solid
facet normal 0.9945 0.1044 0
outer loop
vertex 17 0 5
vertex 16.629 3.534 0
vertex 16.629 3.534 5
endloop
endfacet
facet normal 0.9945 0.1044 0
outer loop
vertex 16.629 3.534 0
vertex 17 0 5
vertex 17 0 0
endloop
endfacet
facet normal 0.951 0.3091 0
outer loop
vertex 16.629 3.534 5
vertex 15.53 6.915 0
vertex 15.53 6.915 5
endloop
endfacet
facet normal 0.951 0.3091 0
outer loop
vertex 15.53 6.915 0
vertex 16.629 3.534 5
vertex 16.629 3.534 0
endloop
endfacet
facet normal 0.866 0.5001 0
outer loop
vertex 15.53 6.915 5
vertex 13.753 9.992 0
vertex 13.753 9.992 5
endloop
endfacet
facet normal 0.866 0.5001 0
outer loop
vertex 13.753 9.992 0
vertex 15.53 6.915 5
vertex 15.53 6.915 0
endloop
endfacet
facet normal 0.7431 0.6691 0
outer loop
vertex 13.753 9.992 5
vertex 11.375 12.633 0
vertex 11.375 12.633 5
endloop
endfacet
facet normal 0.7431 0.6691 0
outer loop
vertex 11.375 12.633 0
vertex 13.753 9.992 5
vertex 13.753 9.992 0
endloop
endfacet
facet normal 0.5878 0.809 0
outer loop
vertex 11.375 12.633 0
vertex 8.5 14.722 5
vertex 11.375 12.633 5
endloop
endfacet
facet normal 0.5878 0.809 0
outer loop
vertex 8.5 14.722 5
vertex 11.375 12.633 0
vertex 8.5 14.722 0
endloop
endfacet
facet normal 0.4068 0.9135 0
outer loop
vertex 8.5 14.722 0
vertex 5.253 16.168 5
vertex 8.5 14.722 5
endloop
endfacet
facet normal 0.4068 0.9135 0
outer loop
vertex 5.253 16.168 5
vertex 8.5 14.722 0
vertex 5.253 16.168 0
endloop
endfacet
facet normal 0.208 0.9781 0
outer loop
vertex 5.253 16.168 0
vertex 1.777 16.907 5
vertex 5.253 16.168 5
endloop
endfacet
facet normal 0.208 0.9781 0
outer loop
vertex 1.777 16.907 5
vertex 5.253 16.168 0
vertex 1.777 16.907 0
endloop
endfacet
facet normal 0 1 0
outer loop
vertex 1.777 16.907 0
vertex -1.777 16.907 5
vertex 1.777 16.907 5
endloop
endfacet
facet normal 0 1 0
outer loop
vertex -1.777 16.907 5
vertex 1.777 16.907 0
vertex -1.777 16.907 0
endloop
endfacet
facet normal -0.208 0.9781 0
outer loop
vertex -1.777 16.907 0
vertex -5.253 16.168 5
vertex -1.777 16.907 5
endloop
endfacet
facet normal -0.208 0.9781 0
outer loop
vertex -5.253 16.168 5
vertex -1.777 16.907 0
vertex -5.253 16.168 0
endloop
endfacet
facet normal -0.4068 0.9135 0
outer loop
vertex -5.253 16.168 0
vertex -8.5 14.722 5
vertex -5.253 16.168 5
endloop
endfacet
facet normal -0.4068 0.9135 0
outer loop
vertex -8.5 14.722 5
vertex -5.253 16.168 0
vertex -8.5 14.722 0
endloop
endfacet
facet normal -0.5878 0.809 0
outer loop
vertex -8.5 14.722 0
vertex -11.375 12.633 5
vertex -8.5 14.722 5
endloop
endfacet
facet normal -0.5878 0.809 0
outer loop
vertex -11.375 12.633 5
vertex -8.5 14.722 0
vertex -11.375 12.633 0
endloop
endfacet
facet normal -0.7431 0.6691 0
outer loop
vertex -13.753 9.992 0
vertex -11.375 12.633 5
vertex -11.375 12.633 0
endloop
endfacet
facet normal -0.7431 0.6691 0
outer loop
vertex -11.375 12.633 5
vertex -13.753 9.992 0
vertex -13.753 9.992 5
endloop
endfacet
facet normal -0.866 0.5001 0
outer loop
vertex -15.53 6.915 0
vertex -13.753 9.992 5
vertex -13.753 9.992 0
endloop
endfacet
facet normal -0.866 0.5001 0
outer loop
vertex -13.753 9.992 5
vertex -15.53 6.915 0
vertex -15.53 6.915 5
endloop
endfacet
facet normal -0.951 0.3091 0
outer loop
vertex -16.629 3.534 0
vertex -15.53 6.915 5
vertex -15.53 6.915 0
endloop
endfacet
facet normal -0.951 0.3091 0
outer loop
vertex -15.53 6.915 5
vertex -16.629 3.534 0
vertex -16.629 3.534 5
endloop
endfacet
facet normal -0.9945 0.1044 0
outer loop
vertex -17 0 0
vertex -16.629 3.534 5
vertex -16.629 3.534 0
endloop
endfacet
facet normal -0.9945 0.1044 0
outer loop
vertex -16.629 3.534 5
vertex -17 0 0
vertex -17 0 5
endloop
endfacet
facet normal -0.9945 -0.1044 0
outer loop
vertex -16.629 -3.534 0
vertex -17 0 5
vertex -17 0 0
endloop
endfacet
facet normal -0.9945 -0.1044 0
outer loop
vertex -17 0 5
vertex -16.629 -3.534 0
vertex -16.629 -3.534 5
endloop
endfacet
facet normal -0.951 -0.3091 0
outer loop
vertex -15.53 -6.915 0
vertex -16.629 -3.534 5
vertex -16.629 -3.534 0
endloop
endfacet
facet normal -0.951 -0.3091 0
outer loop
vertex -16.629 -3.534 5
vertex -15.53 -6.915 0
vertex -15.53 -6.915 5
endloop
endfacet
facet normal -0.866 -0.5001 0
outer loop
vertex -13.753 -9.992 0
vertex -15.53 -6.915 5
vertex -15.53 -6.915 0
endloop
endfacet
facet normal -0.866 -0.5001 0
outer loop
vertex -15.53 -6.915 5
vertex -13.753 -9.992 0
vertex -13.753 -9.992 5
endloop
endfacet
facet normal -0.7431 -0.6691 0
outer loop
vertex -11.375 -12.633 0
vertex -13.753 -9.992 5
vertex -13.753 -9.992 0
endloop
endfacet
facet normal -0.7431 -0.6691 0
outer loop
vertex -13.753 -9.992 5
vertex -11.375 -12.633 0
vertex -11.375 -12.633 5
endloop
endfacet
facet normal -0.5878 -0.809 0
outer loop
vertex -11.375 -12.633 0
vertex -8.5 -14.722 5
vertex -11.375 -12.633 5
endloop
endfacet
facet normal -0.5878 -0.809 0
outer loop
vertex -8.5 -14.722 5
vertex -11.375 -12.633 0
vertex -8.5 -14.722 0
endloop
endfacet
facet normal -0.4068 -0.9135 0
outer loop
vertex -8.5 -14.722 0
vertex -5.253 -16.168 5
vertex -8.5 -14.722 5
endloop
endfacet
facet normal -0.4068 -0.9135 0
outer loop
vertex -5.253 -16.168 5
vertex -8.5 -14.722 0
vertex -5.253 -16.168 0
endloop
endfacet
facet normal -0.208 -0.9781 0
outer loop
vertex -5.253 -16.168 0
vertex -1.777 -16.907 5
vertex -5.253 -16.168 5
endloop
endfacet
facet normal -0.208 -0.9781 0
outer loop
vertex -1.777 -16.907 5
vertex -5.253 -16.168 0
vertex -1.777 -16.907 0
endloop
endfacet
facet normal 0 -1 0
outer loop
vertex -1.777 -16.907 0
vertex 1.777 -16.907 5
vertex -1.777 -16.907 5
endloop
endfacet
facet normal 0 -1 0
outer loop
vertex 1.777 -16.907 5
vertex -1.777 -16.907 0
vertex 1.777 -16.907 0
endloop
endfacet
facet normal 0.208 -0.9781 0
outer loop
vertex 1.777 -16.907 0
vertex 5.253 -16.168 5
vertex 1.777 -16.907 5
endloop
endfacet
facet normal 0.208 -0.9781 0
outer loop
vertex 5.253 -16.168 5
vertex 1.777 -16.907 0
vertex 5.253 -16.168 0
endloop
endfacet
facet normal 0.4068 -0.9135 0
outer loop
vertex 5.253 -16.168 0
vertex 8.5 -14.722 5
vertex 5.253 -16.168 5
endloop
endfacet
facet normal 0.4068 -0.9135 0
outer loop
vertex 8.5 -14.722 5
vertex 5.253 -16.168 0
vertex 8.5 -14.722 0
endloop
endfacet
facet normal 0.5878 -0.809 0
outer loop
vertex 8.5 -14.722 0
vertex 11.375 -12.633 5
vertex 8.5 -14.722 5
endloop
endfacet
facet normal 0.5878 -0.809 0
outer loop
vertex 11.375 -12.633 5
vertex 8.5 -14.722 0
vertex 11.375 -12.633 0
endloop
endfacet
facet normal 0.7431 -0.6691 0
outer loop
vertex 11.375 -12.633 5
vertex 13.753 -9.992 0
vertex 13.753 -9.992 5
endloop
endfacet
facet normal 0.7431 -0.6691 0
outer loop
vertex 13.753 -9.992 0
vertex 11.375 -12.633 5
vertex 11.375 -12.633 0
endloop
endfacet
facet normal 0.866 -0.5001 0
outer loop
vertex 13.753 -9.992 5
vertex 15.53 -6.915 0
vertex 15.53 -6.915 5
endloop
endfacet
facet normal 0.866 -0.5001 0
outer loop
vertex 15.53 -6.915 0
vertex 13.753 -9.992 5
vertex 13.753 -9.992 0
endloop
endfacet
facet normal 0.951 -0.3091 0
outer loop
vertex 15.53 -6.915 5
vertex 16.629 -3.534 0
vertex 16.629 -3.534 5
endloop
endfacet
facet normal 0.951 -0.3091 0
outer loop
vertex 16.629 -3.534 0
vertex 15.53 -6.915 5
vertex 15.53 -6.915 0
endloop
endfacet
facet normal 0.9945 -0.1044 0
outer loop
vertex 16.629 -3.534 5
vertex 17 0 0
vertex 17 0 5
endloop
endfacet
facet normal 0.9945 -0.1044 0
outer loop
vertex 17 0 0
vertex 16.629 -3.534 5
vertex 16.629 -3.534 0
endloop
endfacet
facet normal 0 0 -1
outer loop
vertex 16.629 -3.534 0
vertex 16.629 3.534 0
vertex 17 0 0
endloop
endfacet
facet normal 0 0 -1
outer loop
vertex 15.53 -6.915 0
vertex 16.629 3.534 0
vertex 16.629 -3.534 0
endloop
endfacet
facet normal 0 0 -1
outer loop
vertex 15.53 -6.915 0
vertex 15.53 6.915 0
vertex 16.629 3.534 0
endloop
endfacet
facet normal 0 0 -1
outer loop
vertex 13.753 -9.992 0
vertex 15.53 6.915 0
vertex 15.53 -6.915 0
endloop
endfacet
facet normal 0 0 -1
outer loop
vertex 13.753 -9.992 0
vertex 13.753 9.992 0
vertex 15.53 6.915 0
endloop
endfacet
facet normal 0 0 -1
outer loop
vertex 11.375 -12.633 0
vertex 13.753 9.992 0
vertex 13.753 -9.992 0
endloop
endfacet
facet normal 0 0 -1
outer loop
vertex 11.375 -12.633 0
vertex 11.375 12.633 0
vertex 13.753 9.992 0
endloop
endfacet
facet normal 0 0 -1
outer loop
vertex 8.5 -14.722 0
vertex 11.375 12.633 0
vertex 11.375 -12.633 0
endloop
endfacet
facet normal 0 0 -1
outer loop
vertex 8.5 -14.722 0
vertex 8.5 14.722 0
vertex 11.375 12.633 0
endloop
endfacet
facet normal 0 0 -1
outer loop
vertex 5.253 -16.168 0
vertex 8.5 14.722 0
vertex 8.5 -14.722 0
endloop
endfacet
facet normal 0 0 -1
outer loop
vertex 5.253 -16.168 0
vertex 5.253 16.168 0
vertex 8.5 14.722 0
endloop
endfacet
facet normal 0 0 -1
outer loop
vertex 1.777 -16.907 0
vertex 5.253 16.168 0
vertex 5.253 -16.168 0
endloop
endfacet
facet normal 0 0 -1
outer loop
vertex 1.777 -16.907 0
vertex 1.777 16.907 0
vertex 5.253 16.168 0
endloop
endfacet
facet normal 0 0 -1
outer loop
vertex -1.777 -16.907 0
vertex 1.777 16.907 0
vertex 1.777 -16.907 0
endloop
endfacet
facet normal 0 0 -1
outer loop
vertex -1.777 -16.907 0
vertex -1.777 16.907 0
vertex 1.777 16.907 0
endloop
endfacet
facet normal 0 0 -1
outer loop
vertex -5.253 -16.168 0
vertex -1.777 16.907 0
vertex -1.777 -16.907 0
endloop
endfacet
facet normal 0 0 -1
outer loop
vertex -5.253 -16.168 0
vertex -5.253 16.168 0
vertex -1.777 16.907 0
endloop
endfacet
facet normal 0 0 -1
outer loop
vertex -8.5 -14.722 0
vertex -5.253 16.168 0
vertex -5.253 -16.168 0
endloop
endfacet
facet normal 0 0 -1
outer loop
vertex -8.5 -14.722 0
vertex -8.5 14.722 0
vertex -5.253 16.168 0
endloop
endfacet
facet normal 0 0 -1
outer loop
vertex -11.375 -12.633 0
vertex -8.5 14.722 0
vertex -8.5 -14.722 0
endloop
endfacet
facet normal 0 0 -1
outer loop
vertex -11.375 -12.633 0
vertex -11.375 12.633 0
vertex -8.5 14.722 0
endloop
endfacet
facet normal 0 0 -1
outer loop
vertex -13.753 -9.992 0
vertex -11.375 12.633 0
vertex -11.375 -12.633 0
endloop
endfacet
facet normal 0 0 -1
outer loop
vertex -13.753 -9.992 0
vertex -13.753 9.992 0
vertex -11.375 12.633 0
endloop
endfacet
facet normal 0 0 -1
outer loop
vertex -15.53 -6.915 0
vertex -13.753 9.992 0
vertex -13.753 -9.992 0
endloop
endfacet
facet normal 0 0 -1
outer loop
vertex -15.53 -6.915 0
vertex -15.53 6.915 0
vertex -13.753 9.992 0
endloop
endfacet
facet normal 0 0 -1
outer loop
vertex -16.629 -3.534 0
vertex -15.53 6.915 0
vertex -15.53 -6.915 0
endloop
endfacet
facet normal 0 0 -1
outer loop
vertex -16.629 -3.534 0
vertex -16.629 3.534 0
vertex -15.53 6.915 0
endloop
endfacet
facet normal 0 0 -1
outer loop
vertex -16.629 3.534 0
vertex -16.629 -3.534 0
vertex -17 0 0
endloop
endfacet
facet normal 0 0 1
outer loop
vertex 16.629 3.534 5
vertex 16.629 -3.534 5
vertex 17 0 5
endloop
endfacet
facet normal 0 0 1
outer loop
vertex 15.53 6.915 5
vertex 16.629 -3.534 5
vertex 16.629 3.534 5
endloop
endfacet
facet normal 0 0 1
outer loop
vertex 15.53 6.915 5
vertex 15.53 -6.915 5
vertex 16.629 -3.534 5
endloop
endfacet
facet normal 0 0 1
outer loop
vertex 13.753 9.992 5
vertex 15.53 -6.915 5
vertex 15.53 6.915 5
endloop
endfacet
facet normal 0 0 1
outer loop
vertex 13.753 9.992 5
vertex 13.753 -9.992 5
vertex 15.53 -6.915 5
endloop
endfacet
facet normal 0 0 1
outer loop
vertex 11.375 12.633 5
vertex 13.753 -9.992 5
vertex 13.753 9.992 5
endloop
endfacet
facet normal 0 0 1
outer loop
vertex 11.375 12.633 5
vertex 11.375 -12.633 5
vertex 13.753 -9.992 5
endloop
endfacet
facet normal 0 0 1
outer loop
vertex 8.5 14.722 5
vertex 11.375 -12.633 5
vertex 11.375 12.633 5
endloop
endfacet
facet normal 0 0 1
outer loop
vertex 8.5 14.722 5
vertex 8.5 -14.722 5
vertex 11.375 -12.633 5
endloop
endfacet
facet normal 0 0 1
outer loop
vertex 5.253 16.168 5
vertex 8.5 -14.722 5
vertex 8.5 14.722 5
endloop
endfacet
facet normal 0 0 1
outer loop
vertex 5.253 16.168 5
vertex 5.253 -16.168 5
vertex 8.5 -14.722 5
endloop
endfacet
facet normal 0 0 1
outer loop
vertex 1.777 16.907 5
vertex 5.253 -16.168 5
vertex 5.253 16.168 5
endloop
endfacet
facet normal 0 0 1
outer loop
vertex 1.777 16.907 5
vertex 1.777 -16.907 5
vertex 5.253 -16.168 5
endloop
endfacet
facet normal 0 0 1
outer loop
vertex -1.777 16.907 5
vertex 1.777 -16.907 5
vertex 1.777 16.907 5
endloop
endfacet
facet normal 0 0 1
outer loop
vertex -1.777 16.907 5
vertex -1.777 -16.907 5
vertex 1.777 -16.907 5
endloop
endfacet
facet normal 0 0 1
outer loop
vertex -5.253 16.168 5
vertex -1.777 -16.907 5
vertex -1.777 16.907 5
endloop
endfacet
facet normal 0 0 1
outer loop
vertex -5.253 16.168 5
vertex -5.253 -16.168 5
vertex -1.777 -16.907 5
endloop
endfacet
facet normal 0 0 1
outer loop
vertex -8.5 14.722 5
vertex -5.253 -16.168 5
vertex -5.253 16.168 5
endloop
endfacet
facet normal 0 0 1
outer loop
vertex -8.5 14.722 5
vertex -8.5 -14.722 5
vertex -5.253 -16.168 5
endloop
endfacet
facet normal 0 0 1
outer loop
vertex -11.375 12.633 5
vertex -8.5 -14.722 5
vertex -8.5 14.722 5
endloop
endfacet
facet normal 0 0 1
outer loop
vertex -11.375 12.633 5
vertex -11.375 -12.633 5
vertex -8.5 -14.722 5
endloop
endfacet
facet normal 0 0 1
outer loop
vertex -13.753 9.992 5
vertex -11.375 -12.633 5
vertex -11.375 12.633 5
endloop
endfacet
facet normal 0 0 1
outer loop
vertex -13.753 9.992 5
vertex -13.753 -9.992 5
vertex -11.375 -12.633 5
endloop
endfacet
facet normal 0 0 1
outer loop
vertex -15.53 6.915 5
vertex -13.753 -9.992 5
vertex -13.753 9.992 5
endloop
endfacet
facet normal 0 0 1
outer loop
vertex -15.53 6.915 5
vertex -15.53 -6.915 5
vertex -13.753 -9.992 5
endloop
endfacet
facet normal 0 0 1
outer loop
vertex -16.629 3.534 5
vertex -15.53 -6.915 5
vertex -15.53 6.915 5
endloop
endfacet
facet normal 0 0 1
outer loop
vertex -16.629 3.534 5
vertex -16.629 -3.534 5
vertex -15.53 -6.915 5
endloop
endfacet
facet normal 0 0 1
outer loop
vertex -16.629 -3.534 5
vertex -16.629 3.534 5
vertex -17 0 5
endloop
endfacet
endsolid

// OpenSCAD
// Generated by SolidPython 1.0.1 on 2020-07-29 00:46:44


cylinder(h = 5, r1 = 17, r2 = 17);
/***********************************************
*********      SolidPython code:      **********
************************************************
 
# import packages: SolidPython
from solid import *
from solid.utils import *
from itertools import chain, combinations, permutations


class Resize:

    def __init__(self, scad_file):
        self.scad_file = scad_file
        #self.scad_file = import_scad(scad_file)
        # cone/cylinder param:
        self.r1 = 0
        self.r2 = 0
        self.h = 0
        # rectangular prism param:
        self.w = 0
        self.l = 0
        # ellipse param:
        self.r = 0

    # import OpenScad code (file name corresponds to shape)


    # classify shape + parameters
    def assign(self, param1, param2, param3):
        if self.scad_file == 'cone.scad':
            self.r1 = param1
            self.r2 = param2
            self.h = param3
        elif self.scad_file == 'cylinder.scad':
            self.r1 = param1
            self.r2 = param2
            self.h = param3
        elif self.scad_file == 'rectangularPrism.scad':
            self.h = param1
            self.l = param2
            self.w = param3
        else:
            self.r = param1
            self.h = param2

    # resize parameters
    def iterate(self):
        x = range(3, 20, 2)
        i = 1
        if self.scad_file == 'cone.scad':
            tempList = list(permutations(x, 2))
            for temp in tempList:
                param1 = temp[0]
                param2 = temp[1]
                filepath = 'produced_scad_files/' + 'cone' + str(param1) + '_' + str(param2) + '_' + '.scad'
                scad_render_to_file(cylinder(h=param1, r1=param2, r2=0), filepath)

        elif self.scad_file == 'cylinder.scad':
            tempList = list(permutations(x, 3))
            for temp in tempList:
                param1 = temp[0]
                param2 = temp[1]
                filepath = 'produced_scad_files/' + 'cylinder' + str(param1) + '_' + str(param2) + '_' + '.scad'
                scad_render_to_file(cylinder(h=param1, r1=param2, r2=param2), filepath)

        elif self.scad_file == 'rectangularPrism.scad':
            tempList = list(permutations(x, 3))
            for temp in tempList:
                param1 = temp[0]
                param2 = temp[1]
                param3 = temp[2]
                filepath = 'produced_scad_files/' + 'rectangularPrism' + str(param1) + '_' + str(param2) + '_' + str(
                    param3) + '.scad'
                scad_render_to_file(cube(size=(param1, param2, param3)), filepath)

        elif self.scad_file == 'ellipse.scad':
            tempList = list(permutations(x, 4))
            for temp in tempList:
                param1 = temp[0]
                param2 = temp[1]
                param3 = temp[2]
                param4 = temp[3]
                filepath = 'produced_scad_files/' + 'ellipse' + str(param1) + '_' + str(param2) + '_' + str(param3) + '_' + str(param4) + '.scad'
                scad_render_to_file(scale([param1, param2, param3])(sphere(r=param4)), filepath)

    def render_to_scadfile(self):
        scad_render_to_file(scad, 'example.scad') 
 
************************************************/
